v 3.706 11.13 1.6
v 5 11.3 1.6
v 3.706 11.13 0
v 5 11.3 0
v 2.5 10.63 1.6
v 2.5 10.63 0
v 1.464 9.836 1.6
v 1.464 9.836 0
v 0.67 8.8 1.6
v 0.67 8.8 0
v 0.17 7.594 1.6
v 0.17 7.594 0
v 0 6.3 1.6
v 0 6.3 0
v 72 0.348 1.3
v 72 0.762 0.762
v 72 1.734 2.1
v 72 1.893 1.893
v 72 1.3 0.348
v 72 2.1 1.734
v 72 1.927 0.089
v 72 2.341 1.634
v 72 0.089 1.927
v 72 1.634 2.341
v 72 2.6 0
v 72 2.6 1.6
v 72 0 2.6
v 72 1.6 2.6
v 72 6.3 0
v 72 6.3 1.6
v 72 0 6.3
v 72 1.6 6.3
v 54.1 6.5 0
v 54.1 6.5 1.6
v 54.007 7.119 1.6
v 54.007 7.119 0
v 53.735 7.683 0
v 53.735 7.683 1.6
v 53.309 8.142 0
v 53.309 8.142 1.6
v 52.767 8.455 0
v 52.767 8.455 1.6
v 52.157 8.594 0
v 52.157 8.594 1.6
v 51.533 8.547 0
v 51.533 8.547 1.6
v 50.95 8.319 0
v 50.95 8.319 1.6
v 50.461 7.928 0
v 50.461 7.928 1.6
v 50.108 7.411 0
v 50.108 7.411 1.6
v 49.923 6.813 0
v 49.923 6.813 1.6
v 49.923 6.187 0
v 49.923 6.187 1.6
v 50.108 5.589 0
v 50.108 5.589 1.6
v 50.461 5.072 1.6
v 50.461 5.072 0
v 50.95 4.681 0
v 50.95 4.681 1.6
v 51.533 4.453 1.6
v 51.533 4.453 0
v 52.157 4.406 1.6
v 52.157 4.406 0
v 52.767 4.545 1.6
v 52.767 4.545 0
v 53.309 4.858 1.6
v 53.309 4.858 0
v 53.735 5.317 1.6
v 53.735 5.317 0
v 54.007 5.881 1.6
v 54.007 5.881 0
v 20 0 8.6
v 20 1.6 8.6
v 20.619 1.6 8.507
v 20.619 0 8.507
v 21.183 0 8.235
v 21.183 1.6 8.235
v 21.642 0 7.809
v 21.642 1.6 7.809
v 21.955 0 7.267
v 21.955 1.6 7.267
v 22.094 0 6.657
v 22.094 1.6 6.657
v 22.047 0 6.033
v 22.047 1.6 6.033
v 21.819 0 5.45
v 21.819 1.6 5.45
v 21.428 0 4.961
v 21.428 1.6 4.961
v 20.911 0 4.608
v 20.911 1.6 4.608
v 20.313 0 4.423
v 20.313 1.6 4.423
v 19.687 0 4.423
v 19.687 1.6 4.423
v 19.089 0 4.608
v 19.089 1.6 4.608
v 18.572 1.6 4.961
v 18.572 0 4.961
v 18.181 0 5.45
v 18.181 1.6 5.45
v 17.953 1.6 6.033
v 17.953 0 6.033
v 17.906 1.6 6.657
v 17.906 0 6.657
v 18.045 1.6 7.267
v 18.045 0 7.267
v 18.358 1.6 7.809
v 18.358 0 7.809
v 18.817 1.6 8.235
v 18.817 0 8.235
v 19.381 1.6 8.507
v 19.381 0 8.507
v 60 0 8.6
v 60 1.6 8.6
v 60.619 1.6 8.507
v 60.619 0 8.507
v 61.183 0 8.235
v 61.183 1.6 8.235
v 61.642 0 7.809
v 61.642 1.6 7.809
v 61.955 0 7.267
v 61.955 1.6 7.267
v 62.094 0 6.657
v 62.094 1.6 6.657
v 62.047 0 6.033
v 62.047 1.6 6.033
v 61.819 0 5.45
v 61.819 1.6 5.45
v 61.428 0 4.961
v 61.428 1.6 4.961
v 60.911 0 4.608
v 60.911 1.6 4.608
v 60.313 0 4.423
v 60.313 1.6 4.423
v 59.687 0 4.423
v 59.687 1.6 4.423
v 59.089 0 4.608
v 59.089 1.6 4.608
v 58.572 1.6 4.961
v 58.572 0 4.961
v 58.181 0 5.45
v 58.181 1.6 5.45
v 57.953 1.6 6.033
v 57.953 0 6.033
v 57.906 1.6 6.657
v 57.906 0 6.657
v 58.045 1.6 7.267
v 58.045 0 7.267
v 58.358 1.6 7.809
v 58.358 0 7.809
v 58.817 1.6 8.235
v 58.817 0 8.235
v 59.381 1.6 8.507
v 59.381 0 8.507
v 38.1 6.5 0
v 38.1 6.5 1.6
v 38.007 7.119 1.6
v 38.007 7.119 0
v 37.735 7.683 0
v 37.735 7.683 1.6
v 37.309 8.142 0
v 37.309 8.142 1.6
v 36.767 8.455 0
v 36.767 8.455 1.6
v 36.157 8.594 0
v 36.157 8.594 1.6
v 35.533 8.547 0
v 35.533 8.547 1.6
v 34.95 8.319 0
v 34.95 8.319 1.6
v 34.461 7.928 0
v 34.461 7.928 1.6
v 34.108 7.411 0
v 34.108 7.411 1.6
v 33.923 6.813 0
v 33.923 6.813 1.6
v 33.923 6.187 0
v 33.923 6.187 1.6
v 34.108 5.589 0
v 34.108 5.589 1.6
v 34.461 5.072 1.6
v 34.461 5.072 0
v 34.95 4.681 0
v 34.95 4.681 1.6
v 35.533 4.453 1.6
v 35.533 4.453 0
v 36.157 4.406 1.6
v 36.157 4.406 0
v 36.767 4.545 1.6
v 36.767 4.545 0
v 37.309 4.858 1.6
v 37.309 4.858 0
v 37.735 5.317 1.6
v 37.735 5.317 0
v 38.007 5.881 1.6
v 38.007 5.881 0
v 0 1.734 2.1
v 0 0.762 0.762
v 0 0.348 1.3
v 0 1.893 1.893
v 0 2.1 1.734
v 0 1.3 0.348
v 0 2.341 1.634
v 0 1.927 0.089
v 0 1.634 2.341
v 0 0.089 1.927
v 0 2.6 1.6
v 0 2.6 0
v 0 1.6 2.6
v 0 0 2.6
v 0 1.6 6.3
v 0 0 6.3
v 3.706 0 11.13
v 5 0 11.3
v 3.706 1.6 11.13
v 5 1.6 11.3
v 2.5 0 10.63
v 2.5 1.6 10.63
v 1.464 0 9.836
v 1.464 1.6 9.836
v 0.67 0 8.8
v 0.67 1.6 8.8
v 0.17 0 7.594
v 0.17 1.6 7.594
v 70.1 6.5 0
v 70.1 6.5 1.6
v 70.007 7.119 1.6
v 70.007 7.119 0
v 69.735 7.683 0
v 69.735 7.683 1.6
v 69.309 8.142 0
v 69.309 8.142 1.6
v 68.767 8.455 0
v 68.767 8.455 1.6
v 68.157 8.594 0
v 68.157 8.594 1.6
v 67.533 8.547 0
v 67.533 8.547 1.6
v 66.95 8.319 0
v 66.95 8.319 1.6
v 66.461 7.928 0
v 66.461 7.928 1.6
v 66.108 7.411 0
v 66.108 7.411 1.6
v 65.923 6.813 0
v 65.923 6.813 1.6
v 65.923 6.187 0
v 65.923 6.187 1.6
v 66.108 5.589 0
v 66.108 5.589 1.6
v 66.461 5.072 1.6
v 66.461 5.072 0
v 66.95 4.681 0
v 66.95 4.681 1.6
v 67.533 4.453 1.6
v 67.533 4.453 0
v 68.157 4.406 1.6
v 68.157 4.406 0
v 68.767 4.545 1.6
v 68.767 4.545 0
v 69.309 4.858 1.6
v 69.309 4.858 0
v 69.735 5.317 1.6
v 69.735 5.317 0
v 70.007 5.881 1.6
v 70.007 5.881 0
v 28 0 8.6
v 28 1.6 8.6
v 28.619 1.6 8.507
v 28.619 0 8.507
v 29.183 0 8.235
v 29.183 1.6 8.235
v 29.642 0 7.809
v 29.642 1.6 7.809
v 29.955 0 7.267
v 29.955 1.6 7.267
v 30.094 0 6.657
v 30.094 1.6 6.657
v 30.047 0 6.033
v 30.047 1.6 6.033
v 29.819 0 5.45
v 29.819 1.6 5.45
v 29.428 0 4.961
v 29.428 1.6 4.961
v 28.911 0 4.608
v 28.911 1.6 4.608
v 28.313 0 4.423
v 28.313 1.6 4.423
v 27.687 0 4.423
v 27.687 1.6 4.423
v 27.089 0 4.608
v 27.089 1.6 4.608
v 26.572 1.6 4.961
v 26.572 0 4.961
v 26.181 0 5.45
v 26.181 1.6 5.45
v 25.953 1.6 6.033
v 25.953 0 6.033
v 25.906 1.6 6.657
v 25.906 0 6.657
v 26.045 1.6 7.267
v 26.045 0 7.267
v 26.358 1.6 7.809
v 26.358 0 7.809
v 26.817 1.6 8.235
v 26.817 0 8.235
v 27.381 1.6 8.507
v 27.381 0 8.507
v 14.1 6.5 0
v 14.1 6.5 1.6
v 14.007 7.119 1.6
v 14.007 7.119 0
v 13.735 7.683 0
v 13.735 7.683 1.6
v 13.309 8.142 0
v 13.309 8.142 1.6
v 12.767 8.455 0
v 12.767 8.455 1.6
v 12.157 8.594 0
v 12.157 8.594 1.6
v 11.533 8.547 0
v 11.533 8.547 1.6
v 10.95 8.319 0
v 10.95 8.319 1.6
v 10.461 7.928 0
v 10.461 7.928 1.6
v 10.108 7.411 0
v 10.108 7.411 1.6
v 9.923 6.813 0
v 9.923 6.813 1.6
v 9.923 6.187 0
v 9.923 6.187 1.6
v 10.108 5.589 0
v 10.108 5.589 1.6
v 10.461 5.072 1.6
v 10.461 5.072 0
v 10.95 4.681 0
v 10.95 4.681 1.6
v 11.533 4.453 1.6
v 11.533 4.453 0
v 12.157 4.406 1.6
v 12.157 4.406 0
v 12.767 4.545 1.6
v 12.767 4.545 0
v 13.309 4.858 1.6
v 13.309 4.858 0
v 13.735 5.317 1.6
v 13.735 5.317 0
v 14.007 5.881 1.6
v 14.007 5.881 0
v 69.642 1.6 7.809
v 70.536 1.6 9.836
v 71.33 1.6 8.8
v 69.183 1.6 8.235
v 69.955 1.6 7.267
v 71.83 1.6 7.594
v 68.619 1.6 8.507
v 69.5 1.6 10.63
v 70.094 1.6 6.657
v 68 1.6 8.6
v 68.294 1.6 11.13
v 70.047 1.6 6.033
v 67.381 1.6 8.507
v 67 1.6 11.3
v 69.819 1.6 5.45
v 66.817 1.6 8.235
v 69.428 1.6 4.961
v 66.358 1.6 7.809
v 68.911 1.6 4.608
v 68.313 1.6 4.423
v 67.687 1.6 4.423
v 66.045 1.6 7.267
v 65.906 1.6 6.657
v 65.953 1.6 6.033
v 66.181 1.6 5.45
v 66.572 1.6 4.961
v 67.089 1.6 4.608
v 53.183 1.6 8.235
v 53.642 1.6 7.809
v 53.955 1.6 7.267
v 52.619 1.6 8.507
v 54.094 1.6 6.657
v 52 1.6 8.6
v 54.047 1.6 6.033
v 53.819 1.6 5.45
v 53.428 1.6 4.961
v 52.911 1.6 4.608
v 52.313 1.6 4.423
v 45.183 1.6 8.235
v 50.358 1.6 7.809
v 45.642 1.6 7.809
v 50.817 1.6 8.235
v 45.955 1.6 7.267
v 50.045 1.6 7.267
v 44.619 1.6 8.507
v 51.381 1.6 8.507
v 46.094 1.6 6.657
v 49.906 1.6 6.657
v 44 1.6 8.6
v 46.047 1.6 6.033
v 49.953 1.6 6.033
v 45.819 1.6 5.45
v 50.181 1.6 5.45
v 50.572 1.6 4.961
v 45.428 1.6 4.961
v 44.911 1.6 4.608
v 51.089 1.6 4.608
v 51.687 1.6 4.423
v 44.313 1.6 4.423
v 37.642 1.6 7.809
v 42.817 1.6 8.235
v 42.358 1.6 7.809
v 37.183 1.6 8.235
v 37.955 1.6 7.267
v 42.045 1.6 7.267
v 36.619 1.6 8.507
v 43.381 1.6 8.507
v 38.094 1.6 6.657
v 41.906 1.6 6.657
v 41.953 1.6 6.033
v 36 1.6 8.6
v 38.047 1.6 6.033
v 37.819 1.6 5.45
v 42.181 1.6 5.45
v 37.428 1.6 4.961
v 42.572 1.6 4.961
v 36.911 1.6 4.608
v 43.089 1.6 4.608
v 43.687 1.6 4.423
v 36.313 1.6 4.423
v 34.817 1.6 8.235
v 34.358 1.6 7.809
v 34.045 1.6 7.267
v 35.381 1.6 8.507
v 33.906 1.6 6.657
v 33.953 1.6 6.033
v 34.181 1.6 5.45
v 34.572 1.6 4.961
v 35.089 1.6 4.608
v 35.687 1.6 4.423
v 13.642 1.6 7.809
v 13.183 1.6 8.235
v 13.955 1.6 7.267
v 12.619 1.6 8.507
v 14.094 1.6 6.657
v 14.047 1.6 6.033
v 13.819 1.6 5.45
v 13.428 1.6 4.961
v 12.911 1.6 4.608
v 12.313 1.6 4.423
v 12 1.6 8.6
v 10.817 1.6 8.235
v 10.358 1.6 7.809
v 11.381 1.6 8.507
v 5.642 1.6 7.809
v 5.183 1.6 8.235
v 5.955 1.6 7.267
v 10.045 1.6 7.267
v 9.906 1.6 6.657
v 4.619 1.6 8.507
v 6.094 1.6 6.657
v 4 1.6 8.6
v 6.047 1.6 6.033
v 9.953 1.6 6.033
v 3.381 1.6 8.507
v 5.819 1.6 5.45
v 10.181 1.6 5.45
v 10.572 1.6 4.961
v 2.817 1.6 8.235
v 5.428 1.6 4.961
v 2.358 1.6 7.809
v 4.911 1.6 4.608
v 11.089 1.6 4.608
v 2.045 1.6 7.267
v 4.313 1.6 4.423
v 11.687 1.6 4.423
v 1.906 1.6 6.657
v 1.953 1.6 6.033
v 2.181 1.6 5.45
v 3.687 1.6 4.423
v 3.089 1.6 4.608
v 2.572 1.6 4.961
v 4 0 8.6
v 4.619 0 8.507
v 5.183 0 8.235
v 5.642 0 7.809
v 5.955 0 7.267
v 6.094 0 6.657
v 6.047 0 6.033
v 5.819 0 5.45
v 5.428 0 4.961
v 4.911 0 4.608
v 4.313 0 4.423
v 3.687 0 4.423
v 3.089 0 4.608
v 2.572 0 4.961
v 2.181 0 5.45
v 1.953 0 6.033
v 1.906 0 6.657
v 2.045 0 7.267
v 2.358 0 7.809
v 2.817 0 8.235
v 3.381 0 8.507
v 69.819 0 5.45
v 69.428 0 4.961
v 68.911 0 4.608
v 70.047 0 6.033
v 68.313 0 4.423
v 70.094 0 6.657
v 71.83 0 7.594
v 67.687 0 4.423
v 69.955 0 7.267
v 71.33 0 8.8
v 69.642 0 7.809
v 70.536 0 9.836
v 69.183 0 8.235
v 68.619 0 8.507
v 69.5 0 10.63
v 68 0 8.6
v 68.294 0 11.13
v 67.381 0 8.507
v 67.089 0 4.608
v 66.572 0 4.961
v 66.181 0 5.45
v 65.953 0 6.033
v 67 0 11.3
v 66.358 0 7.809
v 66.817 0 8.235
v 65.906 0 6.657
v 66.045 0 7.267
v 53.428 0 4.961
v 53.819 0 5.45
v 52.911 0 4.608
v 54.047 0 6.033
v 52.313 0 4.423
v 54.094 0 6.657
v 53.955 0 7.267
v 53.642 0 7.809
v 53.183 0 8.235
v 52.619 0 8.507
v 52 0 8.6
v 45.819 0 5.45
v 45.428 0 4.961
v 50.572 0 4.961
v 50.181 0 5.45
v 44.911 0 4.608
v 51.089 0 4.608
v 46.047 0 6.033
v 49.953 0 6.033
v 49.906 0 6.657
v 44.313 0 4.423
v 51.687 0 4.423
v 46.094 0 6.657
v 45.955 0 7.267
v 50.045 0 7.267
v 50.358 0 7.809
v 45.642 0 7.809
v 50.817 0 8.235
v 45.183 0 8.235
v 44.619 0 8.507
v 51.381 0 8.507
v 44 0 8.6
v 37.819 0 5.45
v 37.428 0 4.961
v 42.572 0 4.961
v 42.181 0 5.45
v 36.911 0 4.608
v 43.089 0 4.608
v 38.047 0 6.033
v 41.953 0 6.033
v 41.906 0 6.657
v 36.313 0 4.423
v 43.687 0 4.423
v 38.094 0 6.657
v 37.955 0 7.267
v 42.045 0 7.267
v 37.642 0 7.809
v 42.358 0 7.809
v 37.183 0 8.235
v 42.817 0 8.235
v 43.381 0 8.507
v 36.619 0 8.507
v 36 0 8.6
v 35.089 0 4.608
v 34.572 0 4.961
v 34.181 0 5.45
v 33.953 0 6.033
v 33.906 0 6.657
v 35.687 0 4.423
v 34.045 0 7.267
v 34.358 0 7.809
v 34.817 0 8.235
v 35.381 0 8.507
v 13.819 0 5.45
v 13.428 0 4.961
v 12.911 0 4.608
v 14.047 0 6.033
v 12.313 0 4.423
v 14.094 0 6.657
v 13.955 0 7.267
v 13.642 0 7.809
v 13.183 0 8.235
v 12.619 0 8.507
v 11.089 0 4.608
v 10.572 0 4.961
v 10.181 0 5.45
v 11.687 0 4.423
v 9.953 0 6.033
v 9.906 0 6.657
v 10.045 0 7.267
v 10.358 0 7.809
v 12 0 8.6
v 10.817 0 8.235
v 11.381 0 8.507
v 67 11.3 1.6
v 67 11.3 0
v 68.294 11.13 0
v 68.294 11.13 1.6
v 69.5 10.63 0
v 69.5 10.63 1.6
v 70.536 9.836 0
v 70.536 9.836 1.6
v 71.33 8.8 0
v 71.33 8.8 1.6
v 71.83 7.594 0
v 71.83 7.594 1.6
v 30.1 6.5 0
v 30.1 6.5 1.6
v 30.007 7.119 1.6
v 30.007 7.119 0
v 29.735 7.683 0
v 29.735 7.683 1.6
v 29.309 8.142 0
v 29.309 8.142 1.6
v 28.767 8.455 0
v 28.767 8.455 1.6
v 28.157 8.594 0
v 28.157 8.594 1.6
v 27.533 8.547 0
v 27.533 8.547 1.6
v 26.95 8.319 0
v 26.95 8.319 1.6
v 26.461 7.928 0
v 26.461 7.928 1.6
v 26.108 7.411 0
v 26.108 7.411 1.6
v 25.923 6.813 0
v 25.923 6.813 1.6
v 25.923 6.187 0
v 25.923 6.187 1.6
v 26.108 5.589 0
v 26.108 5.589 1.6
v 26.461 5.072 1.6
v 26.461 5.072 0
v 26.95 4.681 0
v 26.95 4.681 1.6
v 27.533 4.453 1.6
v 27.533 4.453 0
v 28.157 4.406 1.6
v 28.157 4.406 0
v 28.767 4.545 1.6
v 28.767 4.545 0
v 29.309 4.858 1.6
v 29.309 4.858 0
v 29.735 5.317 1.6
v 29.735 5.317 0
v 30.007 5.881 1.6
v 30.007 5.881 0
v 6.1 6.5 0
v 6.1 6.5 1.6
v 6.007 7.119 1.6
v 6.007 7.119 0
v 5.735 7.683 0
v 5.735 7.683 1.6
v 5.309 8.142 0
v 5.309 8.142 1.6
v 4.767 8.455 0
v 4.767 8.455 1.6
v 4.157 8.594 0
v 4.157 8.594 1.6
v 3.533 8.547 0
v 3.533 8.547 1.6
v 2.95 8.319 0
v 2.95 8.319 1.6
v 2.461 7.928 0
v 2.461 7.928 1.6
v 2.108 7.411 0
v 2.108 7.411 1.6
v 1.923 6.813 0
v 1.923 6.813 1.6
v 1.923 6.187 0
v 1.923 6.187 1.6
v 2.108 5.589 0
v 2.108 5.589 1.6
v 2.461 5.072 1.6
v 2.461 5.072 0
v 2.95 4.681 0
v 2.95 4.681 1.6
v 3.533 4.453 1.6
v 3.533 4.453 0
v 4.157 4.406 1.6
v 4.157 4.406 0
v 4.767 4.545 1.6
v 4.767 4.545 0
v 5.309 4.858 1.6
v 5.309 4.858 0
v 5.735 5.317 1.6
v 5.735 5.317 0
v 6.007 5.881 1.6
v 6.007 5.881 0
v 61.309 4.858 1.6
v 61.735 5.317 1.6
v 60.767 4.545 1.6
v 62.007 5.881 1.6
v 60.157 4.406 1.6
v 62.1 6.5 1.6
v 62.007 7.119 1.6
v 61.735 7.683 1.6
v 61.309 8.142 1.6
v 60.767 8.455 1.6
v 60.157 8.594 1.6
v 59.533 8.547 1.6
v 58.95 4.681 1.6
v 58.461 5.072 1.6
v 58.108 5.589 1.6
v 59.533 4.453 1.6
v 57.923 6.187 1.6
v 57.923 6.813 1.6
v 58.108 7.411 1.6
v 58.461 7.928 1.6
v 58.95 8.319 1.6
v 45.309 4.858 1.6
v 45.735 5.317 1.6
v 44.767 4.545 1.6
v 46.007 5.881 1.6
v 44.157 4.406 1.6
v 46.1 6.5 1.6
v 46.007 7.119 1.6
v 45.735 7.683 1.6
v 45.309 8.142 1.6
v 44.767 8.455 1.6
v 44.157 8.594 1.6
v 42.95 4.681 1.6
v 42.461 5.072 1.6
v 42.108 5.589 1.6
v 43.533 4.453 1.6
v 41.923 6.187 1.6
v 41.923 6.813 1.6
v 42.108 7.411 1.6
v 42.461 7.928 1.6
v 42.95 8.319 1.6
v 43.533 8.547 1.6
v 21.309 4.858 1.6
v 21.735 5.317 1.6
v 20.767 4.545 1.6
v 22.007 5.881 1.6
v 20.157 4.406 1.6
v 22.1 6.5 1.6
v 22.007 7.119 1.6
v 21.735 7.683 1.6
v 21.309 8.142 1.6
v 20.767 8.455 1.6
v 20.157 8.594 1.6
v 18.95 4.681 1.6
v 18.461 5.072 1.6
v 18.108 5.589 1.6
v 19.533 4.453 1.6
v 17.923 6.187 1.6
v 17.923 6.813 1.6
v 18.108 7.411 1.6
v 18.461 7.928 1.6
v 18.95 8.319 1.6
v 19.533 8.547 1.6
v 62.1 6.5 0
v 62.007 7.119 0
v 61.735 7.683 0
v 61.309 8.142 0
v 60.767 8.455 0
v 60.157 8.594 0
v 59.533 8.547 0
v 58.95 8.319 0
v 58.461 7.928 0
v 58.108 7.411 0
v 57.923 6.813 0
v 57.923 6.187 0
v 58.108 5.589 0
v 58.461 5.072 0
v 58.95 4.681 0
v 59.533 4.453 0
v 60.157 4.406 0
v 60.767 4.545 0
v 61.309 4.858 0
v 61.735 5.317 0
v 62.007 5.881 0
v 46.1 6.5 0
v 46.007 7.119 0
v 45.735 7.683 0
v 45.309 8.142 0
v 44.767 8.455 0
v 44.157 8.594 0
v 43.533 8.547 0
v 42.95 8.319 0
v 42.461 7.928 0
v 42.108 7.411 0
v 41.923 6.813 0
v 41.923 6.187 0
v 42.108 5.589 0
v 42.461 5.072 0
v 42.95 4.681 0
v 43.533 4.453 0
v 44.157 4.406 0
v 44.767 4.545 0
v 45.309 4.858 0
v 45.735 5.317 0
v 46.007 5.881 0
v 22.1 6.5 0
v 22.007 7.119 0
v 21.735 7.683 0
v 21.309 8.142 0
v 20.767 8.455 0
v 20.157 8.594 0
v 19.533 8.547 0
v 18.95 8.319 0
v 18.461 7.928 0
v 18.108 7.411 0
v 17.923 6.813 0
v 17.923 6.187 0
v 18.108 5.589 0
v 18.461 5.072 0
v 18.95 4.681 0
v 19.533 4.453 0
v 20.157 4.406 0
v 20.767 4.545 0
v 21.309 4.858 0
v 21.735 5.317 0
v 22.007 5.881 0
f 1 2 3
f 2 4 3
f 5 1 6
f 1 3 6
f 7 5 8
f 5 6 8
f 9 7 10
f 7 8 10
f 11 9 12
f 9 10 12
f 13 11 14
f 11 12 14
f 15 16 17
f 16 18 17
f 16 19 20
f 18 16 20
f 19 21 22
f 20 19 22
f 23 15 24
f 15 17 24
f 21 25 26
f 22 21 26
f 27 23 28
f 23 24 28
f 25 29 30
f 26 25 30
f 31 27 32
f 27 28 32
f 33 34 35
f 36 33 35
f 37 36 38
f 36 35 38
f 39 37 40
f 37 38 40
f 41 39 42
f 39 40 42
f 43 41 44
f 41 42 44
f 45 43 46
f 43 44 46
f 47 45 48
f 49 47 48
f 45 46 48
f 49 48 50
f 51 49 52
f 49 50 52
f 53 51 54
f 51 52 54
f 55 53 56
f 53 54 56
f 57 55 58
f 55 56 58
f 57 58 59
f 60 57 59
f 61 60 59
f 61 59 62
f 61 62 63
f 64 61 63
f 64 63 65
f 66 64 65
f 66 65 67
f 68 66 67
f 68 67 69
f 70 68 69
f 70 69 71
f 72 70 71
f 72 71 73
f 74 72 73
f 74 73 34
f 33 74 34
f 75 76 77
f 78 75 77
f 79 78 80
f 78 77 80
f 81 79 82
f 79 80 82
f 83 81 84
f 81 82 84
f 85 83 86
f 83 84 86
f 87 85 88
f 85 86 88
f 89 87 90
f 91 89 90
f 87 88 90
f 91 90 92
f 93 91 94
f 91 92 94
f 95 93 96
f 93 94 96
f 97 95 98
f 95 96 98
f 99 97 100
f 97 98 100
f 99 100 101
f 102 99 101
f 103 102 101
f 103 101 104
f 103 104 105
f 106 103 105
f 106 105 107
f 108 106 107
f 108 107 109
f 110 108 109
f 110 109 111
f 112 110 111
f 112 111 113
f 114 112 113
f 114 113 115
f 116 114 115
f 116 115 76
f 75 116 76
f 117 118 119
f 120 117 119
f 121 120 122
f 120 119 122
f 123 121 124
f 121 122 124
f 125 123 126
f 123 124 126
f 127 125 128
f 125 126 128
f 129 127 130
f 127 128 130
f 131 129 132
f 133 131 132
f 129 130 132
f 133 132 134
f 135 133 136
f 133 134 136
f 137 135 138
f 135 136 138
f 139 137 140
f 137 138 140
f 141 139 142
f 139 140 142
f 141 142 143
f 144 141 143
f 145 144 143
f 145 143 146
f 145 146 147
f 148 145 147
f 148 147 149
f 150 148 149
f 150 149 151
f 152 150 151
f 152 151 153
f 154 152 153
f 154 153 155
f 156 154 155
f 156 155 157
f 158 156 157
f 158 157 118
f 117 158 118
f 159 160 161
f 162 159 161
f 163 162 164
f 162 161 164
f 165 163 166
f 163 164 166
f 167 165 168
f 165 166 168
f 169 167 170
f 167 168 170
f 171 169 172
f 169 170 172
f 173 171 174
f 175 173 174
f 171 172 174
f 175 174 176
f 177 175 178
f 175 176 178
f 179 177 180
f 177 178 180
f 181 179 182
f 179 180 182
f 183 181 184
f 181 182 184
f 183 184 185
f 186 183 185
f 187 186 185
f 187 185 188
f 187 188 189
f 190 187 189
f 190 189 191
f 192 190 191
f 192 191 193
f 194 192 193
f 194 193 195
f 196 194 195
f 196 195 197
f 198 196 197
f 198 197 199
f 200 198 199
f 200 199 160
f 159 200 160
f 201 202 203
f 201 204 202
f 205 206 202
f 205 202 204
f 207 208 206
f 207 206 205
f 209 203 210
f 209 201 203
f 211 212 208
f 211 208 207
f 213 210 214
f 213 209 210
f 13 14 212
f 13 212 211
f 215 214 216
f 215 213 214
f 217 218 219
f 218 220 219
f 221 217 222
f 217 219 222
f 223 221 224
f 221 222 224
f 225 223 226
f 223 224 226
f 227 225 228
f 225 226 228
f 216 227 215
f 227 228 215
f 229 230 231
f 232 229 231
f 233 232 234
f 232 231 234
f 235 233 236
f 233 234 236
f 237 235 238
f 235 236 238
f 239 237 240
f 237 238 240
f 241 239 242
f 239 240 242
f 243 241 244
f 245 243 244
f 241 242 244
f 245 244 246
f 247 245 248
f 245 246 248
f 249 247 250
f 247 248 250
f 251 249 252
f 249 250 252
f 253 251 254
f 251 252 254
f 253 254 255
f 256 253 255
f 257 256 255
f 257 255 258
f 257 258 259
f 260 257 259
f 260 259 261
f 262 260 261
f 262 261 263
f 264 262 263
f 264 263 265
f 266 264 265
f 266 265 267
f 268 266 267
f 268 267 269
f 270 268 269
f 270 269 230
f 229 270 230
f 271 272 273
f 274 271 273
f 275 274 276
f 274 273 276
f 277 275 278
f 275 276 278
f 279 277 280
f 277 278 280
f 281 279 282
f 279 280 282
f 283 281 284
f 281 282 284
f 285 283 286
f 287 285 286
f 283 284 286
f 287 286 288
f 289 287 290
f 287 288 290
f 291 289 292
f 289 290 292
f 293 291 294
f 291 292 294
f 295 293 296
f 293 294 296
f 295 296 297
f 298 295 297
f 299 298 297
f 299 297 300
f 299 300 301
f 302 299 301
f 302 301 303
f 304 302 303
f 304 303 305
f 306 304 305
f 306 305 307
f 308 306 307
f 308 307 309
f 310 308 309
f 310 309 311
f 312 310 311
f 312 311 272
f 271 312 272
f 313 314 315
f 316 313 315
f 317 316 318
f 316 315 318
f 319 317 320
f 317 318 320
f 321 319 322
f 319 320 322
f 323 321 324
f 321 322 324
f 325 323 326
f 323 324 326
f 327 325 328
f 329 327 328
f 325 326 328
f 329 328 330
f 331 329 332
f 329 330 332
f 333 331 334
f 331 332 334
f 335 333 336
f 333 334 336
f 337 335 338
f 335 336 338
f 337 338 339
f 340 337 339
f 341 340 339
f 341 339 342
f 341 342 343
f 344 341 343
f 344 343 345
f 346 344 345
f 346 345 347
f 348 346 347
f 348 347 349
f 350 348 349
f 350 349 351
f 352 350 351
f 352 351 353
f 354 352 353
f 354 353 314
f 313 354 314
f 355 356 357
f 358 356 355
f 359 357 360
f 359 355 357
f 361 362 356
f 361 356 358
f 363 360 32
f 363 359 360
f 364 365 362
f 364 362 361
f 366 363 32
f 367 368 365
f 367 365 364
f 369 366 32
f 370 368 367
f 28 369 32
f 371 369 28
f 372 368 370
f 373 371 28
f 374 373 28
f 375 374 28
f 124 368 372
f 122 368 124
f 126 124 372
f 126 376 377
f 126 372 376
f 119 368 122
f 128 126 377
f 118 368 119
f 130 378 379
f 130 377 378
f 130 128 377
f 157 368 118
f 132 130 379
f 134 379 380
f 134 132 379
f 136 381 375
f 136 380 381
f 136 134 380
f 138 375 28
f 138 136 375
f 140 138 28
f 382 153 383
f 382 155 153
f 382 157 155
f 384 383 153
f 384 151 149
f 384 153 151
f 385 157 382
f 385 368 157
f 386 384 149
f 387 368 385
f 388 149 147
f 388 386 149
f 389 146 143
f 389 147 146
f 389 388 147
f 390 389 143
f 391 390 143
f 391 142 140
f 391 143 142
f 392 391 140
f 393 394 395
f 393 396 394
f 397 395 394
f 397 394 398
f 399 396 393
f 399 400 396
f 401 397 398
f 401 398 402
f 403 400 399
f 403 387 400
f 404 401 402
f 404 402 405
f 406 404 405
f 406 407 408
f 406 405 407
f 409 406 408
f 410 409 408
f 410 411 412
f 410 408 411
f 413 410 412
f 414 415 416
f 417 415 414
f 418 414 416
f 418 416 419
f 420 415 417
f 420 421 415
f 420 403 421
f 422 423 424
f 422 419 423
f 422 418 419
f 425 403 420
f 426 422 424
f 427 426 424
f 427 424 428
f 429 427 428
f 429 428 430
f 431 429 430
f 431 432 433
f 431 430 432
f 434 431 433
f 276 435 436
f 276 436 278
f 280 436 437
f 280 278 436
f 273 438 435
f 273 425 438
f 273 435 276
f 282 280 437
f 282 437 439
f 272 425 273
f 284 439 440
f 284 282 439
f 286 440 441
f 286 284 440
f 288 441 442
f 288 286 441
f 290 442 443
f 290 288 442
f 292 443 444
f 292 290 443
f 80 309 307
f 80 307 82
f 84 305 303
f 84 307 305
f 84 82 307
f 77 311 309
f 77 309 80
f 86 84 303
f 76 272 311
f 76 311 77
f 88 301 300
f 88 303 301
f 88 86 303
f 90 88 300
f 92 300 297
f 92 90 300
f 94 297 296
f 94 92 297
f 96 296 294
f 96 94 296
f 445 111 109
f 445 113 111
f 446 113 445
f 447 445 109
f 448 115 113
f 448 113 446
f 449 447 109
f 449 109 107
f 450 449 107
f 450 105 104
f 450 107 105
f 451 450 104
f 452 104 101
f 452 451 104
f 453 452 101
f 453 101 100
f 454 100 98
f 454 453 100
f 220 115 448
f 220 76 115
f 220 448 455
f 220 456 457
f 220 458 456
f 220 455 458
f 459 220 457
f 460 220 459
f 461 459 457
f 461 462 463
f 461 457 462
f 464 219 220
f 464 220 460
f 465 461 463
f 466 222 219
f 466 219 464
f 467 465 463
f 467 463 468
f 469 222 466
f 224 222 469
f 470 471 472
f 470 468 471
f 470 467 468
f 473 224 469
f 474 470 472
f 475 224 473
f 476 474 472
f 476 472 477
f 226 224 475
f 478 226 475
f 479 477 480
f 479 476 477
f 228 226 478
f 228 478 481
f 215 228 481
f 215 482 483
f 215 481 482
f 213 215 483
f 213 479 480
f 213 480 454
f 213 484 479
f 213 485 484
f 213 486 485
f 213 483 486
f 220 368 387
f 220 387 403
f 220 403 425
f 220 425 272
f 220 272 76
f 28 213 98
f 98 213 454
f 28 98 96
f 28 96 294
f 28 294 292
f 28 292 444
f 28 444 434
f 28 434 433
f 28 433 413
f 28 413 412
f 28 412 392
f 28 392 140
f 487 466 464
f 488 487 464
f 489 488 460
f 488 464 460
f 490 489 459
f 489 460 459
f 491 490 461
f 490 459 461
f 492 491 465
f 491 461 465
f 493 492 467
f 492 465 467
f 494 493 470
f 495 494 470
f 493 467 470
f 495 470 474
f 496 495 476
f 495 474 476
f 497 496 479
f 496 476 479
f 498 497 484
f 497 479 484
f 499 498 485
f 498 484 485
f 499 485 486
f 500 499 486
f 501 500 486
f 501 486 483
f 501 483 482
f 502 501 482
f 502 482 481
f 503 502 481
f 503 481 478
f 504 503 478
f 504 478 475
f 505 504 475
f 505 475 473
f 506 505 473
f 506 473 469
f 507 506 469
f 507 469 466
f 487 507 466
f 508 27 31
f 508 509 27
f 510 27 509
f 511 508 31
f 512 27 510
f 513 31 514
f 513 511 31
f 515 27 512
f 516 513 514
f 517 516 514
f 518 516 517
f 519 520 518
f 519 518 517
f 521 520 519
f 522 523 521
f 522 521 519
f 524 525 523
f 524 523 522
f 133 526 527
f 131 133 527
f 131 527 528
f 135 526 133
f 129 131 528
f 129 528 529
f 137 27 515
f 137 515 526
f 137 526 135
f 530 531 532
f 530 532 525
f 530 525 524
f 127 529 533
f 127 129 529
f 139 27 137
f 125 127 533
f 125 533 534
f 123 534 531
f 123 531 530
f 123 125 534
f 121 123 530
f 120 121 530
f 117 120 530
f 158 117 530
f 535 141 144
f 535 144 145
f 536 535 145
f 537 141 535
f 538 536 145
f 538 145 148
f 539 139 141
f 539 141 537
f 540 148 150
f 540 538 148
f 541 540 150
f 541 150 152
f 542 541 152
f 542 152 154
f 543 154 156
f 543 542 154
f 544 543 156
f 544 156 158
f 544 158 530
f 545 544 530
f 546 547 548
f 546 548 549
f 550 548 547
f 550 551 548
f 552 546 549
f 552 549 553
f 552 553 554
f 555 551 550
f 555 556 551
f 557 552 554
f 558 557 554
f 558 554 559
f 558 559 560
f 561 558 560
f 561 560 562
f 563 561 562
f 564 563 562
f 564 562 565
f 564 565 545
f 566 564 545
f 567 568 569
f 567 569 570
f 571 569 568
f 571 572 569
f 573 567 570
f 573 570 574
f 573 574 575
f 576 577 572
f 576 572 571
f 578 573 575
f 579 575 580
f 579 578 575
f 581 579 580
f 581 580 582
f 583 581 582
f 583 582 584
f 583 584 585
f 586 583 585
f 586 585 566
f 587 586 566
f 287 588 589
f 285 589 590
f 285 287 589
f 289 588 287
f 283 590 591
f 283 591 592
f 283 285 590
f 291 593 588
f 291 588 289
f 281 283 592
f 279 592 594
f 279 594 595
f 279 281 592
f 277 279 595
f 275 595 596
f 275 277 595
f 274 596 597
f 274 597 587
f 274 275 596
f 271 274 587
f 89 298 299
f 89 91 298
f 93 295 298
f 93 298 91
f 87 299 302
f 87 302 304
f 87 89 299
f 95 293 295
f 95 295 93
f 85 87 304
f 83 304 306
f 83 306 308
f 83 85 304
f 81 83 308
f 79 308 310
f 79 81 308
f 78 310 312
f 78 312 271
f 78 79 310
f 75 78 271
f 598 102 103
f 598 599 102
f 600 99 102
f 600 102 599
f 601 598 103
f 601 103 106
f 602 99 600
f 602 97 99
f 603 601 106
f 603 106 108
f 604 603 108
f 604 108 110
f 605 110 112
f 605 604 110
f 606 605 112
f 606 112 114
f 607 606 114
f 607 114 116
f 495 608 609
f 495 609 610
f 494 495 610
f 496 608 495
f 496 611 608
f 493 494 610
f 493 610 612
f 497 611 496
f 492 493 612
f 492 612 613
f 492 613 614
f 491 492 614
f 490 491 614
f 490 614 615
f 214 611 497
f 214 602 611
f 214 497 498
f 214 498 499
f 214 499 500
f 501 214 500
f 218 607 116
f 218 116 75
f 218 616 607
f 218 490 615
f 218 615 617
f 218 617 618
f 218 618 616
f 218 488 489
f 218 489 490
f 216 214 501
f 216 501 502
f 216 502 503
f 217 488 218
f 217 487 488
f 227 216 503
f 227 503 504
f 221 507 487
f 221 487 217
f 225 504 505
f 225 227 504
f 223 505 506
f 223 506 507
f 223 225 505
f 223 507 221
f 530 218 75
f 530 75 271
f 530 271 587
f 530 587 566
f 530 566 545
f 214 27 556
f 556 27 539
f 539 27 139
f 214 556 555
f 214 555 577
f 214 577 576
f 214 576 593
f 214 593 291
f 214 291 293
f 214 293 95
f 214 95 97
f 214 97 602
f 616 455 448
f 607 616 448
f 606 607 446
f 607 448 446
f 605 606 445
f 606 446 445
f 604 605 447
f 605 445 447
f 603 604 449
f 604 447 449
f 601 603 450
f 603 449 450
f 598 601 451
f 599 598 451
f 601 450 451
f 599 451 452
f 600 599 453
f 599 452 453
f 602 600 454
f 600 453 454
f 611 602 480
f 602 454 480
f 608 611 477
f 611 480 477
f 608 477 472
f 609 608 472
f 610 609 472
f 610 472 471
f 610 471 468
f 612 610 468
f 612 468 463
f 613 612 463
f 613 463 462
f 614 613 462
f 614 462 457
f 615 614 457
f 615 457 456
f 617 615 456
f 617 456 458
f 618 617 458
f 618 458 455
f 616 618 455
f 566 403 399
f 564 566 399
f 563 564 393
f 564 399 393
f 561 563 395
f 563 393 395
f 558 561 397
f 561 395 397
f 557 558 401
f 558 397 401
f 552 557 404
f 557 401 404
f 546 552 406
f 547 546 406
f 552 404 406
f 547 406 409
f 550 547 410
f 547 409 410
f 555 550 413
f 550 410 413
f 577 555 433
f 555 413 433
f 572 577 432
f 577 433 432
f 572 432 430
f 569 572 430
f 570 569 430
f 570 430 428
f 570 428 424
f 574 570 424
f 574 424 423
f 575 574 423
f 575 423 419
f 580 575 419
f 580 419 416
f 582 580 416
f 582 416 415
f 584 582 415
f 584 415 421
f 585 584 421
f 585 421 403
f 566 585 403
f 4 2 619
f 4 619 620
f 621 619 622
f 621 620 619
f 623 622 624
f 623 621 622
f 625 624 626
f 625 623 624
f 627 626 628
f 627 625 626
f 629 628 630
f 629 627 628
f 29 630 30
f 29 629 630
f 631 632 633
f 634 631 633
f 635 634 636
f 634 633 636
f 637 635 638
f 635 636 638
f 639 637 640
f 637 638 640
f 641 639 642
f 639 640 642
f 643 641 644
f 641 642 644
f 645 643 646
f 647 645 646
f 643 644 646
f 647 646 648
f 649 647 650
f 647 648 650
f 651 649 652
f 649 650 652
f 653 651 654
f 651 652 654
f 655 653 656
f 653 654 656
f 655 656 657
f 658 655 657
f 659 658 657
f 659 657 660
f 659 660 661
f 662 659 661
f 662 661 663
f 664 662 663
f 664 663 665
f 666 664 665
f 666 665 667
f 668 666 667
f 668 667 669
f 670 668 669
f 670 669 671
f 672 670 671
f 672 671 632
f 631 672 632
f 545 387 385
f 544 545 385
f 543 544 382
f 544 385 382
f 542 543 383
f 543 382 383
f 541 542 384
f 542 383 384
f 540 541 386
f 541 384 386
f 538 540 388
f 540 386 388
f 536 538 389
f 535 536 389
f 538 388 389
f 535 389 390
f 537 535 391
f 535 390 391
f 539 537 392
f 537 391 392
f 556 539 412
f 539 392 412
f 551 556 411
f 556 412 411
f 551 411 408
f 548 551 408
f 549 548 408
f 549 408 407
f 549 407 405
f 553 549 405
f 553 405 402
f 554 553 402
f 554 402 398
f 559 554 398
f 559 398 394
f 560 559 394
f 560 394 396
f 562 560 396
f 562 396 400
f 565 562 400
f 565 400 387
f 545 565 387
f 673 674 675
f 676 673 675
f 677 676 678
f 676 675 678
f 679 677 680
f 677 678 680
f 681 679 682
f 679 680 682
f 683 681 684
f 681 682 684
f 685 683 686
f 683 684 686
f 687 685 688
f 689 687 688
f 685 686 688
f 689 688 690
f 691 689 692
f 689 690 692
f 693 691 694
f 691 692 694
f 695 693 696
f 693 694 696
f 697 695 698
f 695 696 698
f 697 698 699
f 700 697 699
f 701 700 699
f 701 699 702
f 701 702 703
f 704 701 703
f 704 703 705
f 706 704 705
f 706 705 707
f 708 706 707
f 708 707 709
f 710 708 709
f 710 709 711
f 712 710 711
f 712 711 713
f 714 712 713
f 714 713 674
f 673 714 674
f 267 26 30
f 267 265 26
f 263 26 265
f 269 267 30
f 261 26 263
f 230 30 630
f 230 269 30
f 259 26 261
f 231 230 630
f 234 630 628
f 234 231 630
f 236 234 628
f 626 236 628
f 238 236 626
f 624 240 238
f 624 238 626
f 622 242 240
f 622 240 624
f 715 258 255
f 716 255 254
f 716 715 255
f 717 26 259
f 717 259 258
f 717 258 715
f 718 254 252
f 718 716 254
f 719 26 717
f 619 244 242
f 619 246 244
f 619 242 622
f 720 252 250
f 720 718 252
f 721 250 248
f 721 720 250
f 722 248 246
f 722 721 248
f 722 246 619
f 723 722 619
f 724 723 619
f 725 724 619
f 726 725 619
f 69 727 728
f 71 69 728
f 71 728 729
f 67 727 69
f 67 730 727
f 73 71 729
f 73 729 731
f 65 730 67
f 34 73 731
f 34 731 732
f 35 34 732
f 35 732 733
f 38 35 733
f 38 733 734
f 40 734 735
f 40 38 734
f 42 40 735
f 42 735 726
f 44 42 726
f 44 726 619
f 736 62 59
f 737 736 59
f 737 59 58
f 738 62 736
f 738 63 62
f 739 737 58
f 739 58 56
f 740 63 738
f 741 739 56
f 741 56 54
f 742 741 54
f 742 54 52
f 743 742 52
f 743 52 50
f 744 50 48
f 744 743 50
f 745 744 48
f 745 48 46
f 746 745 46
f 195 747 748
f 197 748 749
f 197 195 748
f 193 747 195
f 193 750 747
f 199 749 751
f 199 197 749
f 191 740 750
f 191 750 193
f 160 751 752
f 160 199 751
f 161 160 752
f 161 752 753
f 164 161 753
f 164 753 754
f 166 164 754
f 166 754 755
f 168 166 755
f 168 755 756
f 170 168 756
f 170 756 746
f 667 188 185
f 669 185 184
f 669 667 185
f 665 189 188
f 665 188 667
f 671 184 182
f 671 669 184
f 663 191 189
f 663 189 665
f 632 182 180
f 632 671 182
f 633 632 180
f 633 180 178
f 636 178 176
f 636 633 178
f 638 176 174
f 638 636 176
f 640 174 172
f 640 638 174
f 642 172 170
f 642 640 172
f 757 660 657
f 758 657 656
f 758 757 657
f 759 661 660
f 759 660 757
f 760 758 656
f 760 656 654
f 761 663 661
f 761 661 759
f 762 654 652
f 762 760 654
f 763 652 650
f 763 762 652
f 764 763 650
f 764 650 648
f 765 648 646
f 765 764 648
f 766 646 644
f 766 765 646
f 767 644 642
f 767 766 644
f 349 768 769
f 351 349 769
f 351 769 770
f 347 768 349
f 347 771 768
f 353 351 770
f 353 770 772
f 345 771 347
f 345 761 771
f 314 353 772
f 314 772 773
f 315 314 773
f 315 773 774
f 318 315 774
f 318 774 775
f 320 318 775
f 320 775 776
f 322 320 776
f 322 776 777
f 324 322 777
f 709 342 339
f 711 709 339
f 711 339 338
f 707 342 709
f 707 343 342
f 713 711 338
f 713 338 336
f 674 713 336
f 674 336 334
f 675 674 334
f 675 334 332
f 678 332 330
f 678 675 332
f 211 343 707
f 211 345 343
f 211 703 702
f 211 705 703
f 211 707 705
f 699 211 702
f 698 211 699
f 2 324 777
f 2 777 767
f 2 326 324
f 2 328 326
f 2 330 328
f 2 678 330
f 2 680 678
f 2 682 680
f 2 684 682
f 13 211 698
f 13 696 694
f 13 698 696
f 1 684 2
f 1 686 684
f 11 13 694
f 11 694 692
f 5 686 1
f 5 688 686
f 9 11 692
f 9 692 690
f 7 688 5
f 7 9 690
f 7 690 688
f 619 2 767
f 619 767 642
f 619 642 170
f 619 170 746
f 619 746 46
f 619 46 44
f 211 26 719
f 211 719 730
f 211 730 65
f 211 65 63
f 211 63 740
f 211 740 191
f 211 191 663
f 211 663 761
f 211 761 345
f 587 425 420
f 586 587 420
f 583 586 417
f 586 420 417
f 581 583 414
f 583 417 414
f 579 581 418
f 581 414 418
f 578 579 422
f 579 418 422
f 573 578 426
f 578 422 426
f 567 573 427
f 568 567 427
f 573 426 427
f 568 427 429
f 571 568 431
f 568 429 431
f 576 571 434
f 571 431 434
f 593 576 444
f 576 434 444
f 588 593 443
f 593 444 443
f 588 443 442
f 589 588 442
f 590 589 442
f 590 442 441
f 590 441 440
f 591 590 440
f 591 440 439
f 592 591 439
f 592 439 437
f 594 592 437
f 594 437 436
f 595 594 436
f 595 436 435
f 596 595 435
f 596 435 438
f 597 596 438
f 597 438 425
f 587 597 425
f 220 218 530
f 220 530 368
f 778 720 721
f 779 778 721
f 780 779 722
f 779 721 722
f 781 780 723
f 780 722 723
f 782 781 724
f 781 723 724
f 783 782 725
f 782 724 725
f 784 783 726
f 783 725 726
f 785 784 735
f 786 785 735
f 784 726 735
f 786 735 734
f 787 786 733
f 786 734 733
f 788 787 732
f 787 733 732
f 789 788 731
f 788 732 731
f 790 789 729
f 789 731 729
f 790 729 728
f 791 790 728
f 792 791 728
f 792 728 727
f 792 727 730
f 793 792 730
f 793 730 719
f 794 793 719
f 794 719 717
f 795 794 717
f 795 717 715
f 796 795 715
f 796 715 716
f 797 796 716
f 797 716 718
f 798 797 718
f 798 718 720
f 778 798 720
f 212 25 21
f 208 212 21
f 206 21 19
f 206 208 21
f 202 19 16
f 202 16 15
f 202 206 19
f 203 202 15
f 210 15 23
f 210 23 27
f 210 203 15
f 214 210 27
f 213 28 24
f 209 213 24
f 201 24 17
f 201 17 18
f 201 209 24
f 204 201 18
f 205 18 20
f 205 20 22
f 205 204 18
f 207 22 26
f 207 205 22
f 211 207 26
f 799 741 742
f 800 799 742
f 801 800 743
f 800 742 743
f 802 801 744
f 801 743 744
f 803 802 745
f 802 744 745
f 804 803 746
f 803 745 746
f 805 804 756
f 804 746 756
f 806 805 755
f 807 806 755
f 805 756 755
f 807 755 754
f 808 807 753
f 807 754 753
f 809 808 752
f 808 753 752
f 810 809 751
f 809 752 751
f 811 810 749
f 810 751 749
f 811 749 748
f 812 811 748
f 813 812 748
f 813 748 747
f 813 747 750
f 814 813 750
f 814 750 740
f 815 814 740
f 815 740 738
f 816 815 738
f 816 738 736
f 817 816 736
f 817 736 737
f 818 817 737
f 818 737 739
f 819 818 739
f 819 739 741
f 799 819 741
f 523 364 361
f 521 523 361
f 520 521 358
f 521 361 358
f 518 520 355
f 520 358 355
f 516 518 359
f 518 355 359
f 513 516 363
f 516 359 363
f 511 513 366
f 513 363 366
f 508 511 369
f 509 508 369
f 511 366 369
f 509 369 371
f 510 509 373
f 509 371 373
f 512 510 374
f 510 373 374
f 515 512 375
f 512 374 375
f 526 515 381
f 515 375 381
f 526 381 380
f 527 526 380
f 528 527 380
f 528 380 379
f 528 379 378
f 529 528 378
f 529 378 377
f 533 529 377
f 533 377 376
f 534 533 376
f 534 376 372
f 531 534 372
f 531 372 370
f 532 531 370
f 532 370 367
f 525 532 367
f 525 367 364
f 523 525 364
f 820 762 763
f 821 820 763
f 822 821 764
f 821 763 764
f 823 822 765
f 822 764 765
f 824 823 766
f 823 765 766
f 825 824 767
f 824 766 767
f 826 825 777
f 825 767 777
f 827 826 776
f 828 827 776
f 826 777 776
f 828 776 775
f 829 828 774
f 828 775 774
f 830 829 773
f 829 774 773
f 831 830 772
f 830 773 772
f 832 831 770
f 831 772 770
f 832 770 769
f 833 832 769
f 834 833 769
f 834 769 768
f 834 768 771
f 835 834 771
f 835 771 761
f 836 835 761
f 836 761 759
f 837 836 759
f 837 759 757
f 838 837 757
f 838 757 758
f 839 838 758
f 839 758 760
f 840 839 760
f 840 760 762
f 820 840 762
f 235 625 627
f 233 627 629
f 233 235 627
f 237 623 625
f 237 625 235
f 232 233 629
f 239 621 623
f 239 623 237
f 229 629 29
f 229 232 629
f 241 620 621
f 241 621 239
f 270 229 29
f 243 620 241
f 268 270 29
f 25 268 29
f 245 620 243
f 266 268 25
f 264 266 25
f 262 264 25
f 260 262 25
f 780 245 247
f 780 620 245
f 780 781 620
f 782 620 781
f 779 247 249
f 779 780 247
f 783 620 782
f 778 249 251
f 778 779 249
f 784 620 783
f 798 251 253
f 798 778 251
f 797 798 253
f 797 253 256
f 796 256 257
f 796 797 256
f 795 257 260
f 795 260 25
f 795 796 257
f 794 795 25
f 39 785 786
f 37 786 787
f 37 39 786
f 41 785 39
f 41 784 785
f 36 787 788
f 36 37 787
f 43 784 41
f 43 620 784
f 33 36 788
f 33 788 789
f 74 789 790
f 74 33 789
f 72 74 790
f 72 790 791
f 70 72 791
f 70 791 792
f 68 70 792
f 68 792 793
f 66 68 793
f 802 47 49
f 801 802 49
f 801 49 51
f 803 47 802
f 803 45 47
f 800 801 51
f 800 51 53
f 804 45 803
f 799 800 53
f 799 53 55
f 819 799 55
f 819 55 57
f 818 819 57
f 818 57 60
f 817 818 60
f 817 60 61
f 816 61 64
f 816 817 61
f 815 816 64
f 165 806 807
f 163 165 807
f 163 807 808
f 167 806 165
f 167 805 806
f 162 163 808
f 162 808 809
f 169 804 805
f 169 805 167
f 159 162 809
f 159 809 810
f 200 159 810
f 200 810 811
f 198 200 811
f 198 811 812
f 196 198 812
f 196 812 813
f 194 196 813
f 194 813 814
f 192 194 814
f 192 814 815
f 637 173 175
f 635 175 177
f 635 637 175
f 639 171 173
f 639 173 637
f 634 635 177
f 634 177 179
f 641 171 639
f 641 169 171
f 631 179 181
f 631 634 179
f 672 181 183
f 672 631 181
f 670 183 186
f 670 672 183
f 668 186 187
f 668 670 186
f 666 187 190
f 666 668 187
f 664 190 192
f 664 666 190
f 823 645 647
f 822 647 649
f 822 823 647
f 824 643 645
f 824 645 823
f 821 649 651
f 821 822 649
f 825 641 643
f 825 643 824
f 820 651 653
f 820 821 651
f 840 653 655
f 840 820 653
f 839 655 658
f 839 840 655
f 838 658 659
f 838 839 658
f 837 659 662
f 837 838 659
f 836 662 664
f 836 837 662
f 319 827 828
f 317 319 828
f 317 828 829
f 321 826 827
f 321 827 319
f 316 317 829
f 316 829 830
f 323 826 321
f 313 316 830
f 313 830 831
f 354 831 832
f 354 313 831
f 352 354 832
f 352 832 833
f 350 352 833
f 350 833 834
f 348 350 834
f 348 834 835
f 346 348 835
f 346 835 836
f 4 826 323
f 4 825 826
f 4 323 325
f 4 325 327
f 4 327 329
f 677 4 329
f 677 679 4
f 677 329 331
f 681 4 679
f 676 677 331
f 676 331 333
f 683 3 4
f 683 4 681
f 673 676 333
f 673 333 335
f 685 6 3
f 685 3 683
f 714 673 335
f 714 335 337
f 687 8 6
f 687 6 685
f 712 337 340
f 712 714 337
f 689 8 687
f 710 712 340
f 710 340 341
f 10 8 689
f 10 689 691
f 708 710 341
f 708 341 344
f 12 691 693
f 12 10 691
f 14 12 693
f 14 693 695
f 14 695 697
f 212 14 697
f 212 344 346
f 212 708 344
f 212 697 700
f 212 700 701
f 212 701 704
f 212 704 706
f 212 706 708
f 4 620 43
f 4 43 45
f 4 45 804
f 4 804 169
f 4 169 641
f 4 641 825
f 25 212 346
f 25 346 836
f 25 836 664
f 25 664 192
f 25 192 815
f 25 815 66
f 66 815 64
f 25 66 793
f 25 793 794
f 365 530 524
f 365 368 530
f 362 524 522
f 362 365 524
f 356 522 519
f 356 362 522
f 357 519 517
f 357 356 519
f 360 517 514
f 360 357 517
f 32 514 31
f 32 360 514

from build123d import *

# Parameters (mm, degrees)
BASE_FLANGE1_DEPTH = 72
FILLET1_R          = 5
SKETCH6_R          = 2.1
CUT_EXTRUDE1_DEPTH = 74.524009684
SKETCH7_R          = 2.1
CUT_EXTRUDE2_DEPTH = 74.524009684
LPATTERN1_COUNT    = 9
LPATTERN1_PITCH    = 8


# Sheet-metal steps are written as plain solids
with BuildPart() as part:
    # Sketch1 → Base-Flange1 (new body)
    with BuildSketch(Plane(origin=(0, 0, 0), x_dir=(0, 0, -1), z_dir=(1, 0, 0))):
        with BuildLine():
            Line((0, 11.3), (0, 2.6))
            ThreePointArc((0, 2.6), (-0.761522369, 0.761522369), (-2.6, 0))
            Line((-2.6, 0), (-11.3, 0))
            Line((-11.3, 0), (-11.3, 1.6))
            Line((-11.3, 1.6), (-2.6, 1.6))
            ThreePointArc((-2.6, 1.6), (-1.892893219, 1.892893219), (-1.6, 2.6))
            Line((-1.6, 2.6), (-1.6, 11.3))
            Line((-1.6, 11.3), (0, 11.3))
        make_face()
    extrude(amount=BASE_FLANGE1_DEPTH)

    # Fillet1
    fillet1_edges = [part.edges().sort_by_distance(p)[0] for p in [
        (72, 11.3, 0.8),
        (72, 0.8, 11.3),
        (0, 11.3, 0.8),
        (0, 0.8, 11.3),
    ]]
    fillet(fillet1_edges, radius=FILLET1_R)

    # Sketch6 → Cut-Extrude1 (cut, through all)
    with BuildSketch(Plane.XY.offset(1.6)):
        with Locations((4, 6.5)):
            Circle(SKETCH6_R)
    cut_extrude1 = extrude(amount=-CUT_EXTRUDE1_DEPTH, mode=Mode.SUBTRACT)

    # Sketch7 → Cut-Extrude2 (cut, through all)
    with BuildSketch(Plane(origin=(0, 1.6, 0), x_dir=(1, 0, 0), z_dir=(0, 1, 0))):
        with Locations(Location((4, -6.5, 0), (0, 0, 270))):
            Circle(SKETCH7_R)
    cut_extrude2 = extrude(amount=-CUT_EXTRUDE2_DEPTH, mode=Mode.SUBTRACT)

    # LPattern1: Cut-Extrude1, Cut-Extrude2 ×9
    with Locations(*[(i * LPATTERN1_PITCH, 0, 0) for i in range(1, LPATTERN1_COUNT)]):
        add(cut_extrude1, mode=Mode.SUBTRACT)
        add(cut_extrude2, mode=Mode.SUBTRACT)


solid = part.part
